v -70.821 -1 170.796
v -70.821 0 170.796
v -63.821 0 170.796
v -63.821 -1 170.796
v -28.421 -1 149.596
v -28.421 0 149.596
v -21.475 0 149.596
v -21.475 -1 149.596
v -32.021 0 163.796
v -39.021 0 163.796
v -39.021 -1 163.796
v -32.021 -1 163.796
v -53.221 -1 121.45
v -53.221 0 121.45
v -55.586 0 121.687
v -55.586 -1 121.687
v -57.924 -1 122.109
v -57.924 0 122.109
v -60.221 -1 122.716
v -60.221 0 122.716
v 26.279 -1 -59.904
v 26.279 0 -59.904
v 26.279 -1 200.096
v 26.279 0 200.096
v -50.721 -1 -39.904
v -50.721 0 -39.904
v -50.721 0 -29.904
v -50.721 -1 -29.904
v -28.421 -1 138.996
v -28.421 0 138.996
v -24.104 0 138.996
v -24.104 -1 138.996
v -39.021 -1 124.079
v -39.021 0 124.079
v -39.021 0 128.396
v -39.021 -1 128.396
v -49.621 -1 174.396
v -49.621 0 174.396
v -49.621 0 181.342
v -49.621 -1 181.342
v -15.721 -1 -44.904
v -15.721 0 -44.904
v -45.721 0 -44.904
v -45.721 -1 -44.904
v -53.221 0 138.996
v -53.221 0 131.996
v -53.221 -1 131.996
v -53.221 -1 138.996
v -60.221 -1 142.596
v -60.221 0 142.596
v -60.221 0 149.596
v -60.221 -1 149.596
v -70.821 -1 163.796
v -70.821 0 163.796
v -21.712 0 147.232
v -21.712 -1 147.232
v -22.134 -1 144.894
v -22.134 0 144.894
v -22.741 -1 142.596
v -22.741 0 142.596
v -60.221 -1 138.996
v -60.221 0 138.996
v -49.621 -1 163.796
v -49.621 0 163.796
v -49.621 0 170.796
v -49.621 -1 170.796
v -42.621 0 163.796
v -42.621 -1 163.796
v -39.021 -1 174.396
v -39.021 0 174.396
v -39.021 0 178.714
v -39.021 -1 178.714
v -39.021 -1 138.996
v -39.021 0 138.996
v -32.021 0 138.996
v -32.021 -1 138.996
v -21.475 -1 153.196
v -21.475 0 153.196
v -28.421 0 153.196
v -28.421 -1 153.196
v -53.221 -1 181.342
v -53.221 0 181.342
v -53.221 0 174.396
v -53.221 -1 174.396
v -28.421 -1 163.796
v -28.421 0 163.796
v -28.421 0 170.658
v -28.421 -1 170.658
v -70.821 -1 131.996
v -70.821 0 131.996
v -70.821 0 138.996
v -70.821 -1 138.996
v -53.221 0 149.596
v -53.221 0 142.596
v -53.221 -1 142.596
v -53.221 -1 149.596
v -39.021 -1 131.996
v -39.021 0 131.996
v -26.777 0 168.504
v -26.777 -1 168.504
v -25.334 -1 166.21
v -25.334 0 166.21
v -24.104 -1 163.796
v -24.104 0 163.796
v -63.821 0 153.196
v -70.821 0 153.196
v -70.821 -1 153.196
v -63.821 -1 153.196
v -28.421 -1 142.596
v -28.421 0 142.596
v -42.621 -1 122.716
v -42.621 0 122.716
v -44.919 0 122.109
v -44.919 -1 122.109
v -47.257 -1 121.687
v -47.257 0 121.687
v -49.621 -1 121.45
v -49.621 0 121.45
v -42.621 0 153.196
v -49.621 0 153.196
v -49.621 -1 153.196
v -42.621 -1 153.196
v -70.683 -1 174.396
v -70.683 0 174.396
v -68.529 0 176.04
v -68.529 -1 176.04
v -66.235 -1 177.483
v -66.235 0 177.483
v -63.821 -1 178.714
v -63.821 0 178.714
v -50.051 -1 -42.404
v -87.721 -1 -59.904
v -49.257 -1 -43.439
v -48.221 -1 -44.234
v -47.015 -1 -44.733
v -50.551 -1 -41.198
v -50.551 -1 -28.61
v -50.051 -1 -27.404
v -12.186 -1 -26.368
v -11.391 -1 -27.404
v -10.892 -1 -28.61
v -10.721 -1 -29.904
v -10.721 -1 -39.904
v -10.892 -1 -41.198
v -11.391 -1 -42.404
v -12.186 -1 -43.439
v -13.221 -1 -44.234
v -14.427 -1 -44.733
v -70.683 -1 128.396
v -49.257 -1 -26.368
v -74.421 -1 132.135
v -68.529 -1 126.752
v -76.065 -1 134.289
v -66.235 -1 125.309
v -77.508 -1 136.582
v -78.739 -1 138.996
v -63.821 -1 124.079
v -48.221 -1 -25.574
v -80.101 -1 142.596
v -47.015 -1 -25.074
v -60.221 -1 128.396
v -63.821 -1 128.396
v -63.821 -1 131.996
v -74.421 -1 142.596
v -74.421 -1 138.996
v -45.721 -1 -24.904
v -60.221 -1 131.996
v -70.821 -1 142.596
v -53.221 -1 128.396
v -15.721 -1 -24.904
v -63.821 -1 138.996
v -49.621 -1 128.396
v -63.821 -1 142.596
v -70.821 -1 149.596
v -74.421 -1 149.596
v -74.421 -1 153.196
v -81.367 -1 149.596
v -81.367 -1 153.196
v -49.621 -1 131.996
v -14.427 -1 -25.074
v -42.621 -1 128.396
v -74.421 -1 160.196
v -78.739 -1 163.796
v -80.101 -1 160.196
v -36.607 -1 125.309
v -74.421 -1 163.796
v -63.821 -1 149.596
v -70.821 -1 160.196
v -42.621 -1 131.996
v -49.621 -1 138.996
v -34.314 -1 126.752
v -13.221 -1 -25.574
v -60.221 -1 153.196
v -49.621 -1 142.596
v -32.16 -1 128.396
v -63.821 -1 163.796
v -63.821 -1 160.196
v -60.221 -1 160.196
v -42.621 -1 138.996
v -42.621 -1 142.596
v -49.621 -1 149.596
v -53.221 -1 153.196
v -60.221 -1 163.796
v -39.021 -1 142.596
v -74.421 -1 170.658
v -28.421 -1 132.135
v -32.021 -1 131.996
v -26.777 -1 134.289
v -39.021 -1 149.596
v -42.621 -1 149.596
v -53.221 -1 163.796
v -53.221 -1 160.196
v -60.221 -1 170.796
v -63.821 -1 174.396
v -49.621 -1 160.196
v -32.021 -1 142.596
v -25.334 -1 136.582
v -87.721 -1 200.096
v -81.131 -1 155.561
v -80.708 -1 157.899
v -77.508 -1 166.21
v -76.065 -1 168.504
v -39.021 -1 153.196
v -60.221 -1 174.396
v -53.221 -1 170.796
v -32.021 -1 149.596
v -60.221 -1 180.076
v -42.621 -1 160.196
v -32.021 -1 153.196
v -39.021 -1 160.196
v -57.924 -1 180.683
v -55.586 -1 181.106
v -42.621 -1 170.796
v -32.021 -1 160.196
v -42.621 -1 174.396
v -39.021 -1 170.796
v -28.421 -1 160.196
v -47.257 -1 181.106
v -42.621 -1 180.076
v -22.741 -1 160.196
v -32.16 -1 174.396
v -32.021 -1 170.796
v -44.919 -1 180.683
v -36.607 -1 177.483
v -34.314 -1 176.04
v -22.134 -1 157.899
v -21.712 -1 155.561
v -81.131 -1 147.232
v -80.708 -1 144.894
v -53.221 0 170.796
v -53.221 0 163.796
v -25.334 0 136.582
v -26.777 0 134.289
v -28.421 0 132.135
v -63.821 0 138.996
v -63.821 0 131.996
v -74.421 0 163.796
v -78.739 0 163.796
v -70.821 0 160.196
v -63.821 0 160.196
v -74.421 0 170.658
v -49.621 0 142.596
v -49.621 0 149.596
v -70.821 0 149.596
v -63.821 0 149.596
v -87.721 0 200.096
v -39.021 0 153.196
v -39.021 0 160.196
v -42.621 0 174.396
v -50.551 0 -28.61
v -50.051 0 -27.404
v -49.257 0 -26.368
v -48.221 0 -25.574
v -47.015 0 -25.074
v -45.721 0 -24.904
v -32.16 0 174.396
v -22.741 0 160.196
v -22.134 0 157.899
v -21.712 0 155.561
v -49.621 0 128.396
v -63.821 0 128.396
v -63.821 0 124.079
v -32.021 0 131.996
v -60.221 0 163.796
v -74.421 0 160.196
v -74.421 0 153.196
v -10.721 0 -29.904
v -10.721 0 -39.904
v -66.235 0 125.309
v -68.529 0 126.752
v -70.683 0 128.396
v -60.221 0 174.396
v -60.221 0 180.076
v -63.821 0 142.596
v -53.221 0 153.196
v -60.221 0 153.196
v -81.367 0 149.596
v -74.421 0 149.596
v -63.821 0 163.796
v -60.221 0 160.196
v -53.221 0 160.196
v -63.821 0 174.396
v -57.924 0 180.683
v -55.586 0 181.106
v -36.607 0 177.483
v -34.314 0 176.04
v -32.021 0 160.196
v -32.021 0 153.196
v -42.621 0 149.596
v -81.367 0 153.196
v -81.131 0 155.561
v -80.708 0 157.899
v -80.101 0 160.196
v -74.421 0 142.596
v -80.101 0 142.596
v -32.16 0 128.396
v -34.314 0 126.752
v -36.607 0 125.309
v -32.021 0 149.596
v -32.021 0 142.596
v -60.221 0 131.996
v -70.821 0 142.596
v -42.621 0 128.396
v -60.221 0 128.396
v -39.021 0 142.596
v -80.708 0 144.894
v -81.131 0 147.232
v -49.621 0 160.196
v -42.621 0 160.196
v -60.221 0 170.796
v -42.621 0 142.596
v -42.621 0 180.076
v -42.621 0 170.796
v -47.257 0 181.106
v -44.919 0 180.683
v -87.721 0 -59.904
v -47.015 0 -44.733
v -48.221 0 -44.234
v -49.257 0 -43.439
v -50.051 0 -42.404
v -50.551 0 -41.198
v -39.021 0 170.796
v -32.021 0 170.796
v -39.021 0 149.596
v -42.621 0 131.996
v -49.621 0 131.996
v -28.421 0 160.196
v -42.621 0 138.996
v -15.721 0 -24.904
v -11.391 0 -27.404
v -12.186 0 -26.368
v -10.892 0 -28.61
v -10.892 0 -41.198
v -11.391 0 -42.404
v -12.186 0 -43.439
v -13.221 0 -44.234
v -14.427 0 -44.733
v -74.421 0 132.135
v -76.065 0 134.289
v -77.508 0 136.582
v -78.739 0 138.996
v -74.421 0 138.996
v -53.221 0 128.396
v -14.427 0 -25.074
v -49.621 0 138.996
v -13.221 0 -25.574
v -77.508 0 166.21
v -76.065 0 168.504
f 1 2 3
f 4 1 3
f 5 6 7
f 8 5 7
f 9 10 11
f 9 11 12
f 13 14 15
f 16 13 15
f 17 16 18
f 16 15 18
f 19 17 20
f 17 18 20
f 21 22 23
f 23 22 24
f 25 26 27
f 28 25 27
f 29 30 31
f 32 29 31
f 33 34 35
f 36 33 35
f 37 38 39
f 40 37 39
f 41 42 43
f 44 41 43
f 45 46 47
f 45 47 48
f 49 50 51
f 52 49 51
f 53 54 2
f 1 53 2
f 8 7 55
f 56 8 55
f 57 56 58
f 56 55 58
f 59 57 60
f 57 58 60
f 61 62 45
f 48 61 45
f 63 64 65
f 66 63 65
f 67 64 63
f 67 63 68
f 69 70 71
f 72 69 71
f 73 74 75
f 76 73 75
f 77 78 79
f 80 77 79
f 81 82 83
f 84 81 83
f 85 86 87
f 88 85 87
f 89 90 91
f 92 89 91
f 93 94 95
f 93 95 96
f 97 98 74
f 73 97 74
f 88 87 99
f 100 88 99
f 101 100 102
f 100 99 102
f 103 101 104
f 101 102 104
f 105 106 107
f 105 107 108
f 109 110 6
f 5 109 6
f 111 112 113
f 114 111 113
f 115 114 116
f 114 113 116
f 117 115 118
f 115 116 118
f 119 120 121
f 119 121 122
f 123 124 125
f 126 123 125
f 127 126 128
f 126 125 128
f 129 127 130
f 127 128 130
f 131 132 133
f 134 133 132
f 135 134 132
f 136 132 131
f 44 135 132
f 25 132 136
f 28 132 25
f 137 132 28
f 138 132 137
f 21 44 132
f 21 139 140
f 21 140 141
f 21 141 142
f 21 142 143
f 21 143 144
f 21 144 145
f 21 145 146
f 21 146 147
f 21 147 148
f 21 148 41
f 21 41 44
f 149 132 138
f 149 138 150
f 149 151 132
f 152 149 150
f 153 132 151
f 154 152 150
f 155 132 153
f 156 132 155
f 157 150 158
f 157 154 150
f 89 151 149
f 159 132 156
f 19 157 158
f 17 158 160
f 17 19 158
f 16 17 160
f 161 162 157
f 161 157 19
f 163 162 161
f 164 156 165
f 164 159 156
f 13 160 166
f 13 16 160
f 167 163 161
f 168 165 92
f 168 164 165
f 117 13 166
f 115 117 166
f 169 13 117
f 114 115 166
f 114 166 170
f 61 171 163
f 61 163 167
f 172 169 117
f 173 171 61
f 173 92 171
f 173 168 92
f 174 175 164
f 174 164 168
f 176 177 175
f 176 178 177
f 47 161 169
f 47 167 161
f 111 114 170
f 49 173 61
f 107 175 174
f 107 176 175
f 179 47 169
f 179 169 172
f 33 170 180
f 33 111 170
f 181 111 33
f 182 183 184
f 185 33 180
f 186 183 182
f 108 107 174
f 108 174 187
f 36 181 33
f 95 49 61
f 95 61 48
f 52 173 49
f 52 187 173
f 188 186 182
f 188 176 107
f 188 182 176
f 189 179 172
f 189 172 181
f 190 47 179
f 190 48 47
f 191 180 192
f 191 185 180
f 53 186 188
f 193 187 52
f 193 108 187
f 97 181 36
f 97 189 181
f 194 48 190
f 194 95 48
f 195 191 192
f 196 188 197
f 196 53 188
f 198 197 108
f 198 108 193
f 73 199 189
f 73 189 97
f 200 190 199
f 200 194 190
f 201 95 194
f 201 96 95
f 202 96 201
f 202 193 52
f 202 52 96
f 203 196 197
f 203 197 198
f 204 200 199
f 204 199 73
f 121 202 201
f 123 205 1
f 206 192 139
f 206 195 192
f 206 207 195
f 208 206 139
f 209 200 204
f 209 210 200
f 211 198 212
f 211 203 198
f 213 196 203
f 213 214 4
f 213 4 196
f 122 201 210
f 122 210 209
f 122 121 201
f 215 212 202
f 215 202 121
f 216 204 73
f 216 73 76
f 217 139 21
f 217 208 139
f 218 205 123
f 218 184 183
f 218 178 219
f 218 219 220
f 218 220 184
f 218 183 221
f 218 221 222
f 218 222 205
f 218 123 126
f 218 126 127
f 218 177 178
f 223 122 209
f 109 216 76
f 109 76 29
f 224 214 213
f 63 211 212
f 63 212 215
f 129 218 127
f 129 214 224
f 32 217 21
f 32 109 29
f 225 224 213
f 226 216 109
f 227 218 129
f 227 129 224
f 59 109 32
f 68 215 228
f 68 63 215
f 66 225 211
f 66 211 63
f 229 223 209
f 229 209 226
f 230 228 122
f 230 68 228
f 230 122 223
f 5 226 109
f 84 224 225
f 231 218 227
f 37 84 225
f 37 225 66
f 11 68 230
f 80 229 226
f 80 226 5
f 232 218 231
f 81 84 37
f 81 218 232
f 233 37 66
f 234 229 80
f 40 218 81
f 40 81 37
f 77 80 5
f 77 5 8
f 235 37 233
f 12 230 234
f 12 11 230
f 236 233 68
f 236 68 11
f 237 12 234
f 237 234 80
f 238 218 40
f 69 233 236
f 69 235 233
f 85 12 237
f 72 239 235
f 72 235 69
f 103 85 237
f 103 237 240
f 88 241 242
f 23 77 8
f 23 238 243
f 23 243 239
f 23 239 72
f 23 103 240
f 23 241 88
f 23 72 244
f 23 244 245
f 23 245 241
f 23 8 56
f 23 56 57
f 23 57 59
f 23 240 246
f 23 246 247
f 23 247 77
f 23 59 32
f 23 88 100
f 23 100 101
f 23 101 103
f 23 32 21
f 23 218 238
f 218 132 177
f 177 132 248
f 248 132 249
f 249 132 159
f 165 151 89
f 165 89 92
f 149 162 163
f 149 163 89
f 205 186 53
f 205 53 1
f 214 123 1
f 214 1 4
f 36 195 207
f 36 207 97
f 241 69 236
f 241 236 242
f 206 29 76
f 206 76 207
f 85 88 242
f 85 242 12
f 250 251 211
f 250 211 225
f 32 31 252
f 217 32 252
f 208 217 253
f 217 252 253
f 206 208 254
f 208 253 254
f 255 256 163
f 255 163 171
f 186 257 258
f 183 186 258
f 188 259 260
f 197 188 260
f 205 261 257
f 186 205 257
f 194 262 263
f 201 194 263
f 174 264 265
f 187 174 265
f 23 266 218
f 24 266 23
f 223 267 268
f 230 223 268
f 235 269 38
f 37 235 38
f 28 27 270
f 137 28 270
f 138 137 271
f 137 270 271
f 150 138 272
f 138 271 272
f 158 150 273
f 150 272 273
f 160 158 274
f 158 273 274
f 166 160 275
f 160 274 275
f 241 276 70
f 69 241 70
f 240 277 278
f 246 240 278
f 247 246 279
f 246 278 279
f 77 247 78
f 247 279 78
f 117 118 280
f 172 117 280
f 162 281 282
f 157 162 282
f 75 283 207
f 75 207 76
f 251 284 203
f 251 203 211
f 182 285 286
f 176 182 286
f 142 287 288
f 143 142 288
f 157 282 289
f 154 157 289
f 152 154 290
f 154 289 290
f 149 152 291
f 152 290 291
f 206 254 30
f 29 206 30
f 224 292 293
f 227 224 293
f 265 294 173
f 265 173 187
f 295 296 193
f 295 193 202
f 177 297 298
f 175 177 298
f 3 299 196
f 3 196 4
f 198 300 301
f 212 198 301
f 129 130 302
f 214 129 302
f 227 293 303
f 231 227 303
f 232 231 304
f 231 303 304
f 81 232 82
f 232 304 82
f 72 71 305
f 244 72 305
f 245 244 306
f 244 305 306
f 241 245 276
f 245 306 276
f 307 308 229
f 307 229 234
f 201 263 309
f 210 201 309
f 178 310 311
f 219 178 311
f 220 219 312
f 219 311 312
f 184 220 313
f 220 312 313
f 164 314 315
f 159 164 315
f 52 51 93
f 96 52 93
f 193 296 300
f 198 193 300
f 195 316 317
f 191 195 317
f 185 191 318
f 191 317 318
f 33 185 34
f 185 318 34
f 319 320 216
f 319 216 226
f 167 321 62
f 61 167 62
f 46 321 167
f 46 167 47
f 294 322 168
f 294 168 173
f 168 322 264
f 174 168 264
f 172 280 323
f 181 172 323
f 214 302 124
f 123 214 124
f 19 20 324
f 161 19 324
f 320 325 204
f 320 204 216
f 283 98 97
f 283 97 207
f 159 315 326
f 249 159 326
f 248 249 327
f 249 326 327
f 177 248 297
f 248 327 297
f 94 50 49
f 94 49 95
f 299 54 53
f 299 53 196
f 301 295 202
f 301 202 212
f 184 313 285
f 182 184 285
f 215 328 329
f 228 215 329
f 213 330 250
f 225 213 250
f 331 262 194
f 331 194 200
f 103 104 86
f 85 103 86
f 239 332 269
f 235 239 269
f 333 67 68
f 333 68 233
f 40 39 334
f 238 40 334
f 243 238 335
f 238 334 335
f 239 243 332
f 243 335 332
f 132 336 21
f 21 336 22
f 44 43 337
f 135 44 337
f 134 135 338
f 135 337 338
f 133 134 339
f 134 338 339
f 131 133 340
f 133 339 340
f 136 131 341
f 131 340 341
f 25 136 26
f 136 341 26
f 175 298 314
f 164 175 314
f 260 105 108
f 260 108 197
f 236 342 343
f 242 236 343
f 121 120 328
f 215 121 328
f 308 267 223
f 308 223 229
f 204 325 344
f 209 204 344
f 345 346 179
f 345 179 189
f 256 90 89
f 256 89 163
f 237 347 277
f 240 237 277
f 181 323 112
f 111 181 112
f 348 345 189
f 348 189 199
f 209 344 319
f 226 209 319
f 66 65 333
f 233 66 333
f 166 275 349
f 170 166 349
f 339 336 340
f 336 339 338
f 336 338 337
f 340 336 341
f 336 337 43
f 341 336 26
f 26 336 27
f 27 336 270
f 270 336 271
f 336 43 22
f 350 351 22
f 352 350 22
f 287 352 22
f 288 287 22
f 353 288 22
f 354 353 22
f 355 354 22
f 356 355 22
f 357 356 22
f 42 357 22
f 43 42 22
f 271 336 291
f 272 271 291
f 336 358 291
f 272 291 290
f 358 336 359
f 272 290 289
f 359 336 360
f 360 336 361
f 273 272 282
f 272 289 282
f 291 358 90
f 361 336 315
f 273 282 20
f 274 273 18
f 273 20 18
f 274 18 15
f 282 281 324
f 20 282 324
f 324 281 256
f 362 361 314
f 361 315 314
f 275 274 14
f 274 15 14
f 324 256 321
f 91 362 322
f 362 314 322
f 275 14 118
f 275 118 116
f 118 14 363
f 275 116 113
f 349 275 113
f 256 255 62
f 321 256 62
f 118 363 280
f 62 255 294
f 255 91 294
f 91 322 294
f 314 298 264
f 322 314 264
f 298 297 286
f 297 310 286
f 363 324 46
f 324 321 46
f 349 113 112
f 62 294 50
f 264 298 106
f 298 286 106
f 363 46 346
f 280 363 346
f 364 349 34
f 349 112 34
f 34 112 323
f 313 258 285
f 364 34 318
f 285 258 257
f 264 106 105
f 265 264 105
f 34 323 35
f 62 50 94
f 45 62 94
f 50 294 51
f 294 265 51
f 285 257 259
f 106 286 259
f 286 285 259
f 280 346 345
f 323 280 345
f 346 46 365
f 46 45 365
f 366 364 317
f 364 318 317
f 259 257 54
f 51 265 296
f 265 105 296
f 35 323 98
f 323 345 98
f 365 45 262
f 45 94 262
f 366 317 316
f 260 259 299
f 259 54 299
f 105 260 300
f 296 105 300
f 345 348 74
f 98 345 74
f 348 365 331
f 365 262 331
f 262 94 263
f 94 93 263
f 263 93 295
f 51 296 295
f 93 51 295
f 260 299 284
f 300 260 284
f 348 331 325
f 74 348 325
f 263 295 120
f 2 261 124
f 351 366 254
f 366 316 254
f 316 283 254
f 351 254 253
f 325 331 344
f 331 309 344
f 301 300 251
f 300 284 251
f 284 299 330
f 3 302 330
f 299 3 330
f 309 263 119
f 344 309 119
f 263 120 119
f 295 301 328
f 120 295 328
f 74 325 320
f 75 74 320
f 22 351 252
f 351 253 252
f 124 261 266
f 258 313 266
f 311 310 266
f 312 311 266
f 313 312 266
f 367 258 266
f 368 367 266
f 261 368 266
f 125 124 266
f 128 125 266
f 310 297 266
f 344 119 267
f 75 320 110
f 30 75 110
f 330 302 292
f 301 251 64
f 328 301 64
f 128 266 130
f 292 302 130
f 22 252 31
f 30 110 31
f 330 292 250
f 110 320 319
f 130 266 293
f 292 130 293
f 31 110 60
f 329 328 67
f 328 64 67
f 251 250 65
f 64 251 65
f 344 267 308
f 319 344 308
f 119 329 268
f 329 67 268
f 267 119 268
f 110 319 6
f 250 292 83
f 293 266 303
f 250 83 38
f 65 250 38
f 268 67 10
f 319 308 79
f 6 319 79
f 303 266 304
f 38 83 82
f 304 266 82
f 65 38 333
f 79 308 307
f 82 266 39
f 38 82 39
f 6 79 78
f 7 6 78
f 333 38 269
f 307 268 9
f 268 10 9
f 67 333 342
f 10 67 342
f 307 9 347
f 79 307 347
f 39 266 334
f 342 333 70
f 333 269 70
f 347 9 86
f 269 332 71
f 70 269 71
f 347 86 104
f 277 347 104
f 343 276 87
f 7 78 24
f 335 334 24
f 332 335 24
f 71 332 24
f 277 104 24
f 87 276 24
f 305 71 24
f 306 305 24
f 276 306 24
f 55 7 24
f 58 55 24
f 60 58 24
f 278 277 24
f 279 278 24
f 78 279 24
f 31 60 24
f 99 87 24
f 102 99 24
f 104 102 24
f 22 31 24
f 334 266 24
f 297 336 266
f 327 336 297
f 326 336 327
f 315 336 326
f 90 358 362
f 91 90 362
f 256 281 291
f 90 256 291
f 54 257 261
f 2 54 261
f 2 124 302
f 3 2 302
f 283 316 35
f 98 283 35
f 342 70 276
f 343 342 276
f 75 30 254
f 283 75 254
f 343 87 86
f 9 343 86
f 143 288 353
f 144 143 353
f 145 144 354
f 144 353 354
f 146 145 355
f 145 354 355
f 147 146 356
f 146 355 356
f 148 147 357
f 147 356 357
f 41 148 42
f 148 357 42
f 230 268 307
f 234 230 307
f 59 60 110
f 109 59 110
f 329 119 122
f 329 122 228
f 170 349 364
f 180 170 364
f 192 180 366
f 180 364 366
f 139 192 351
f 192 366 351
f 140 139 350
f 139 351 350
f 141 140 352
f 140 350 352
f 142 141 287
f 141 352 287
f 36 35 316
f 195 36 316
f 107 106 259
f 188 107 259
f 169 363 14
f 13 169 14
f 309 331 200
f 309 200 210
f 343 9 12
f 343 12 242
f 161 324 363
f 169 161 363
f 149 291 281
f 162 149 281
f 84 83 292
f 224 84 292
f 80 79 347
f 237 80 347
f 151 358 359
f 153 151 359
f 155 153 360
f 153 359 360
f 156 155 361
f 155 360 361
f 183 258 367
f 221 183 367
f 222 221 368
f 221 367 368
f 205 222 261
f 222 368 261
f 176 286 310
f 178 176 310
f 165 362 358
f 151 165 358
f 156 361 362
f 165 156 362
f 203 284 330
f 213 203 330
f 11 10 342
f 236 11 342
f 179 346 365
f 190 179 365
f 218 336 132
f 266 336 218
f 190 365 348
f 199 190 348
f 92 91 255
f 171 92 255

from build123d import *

# Parameters (mm, degrees)
F0_W     = 114
F0_H     = 260
F0_W_2   = 7
F0_H_2   = 7
F1_DEPTH = 1


with BuildPart() as f1:
    # F0 (on Front) → F1 (new body)
    with BuildSketch(Plane.XZ):
        with Locations((-30.721168, 70.096179)):
            Rectangle(F0_W, F0_H)
        with BuildLine():
            ThreePointArc((-50.721168, -29.903821), (-49.256702, -26.368287), (-45.721168, -24.903821))
            Line((-45.721168, -24.903821), (-15.721168, -24.903821))
            ThreePointArc((-15.721168, -24.903821), (-12.185634, -26.368287), (-10.721168, -29.903821))
            Line((-10.721168, -29.903821), (-10.721168, -39.903821))
            ThreePointArc((-10.721168, -39.903821), (-12.185634, -43.439354), (-15.721168, -44.903821))
            Line((-15.721168, -44.903821), (-45.721168, -44.903821))
            ThreePointArc((-45.721168, -44.903821), (-49.256702, -43.439354), (-50.721168, -39.903821))
            Line((-50.721168, -39.903821), (-50.721168, -29.903821))
        make_face(mode=Mode.SUBTRACT)
        with Locations((-77.921168, 114.296179)):
            Rectangle(F0_W_2, F0_H_2, mode=Mode.SUBTRACT)
        with Locations((-77.921168, 124.896179)):
            Rectangle(F0_W_2, F0_H_2, mode=Mode.SUBTRACT)
        with Locations((-67.321168, 114.296179)):
            Rectangle(F0_W_2, F0_H_2, mode=Mode.SUBTRACT)
        with Locations((-56.721168, 114.296179)):
            Rectangle(F0_W_2, F0_H_2, mode=Mode.SUBTRACT)
        with Locations((-46.121168, 114.296179)):
            Rectangle(F0_W_2, F0_H_2, mode=Mode.SUBTRACT)
        with Locations((-35.521168, 114.296179)):
            Rectangle(F0_W_2, F0_H_2, mode=Mode.SUBTRACT)
        with Locations((-77.921168, 177.896179)):
            Rectangle(F0_W_2, F0_H_2, mode=Mode.SUBTRACT)
        with BuildLine():
            ThreePointArc((-21.475216, 153.196179), (-21.434683, 152.296585), (-21.421168, 151.396179))
            ThreePointArc((-21.421168, 151.396179), (-21.434683, 150.495774), (-21.475216, 149.596179))
            Line((-21.475216, 149.596179), (-21.421168, 149.596179))
            Line((-21.421168, 149.596179), (-21.421168, 142.596179))
            Line((-21.421168, 142.596179), (-22.740861, 142.596179))
            ThreePointArc((-22.740861, 142.596179), (-23.364518, 140.774297), (-24.103774, 138.996179))
            Line((-24.103774, 138.996179), (-21.421168, 138.996179))
            Line((-21.421168, 138.996179), (-21.421168, 131.996179))
            Line((-21.421168, 131.996179), (-28.421168, 131.996179))
            Line((-28.421168, 131.996179), (-28.421168, 132.134819))
            ThreePointArc((-28.421168, 132.134819), (-30.207964, 130.182976), (-32.159807, 128.396179))
            Line((-32.159807, 128.396179), (-32.021168, 128.396179))
            Line((-32.021168, 128.396179), (-32.021168, 121.396179))
            Line((-32.021168, 121.396179), (-39.021168, 121.396179))
            Line((-39.021168, 121.396179), (-39.021168, 124.078786))
            ThreePointArc((-39.021168, 124.078786), (-40.799286, 123.339529), (-42.621168, 122.715873))
            Line((-42.621168, 122.715873), (-42.621168, 121.396179))
            Line((-42.621168, 121.396179), (-49.621168, 121.396179))
            Line((-49.621168, 121.396179), (-49.621168, 121.450228))
            ThreePointArc((-49.621168, 121.450228), (-51.421168, 121.396179), (-53.221168, 121.450228))
            Line((-53.221168, 121.450228), (-53.221168, 121.396179))
            Line((-53.221168, 121.396179), (-60.221168, 121.396179))
            Line((-60.221168, 121.396179), (-60.221168, 122.715873))
            ThreePointArc((-60.221168, 122.715873), (-62.04305, 123.339529), (-63.821168, 124.078786))
            Line((-63.821168, 124.078786), (-63.821168, 121.396179))
            Line((-63.821168, 121.396179), (-70.821168, 121.396179))
            Line((-70.821168, 121.396179), (-70.821168, 128.396179))
            Line((-70.821168, 128.396179), (-70.682528, 128.396179))
            ThreePointArc((-70.682528, 128.396179), (-72.634371, 130.182976), (-74.421168, 132.134819))
            Line((-74.421168, 132.134819), (-74.421168, 131.996179))
            Line((-74.421168, 131.996179), (-81.421168, 131.996179))
            Line((-81.421168, 131.996179), (-81.421168, 138.996179))
            Line((-81.421168, 138.996179), (-78.738562, 138.996179))
            ThreePointArc((-78.738562, 138.996179), (-79.477818, 140.774297), (-80.101475, 142.596179))
            Line((-80.101475, 142.596179), (-81.421168, 142.596179))
            Line((-81.421168, 142.596179), (-81.421168, 149.596179))
            Line((-81.421168, 149.596179), (-81.367119, 149.596179))
            ThreePointArc((-81.367119, 149.596179), (-81.421168, 151.396179), (-81.367119, 153.196179))
            Line((-81.367119, 153.196179), (-81.421168, 153.196179))
            Line((-81.421168, 153.196179), (-81.421168, 160.196179))
            Line((-81.421168, 160.196179), (-80.101475, 160.196179))
            ThreePointArc((-80.101475, 160.196179), (-79.477818, 162.018062), (-78.738562, 163.796179))
            Line((-78.738562, 163.796179), (-81.421168, 163.796179))
            Line((-81.421168, 163.796179), (-81.421168, 170.796179))
            Line((-81.421168, 170.796179), (-74.421168, 170.796179))
            Line((-74.421168, 170.796179), (-74.421168, 170.65754))
            ThreePointArc((-74.421168, 170.65754), (-72.634371, 172.609383), (-70.682528, 174.396179))
            Line((-70.682528, 174.396179), (-70.821168, 174.396179))
            Line((-70.821168, 174.396179), (-70.821168, 181.396179))
            Line((-70.821168, 181.396179), (-63.821168, 181.396179))
            Line((-63.821168, 181.396179), (-63.821168, 178.713573))
            ThreePointArc((-63.821168, 178.713573), (-62.04305, 179.45283), (-60.221168, 180.076486))
            Line((-60.221168, 180.076486), (-60.221168, 181.396179))
            Line((-60.221168, 181.396179), (-53.221168, 181.396179))
            Line((-53.221168, 181.396179), (-53.221168, 181.342131))
            ThreePointArc((-53.221168, 181.342131), (-51.421168, 181.396179), (-49.621168, 181.342131))
            Line((-49.621168, 181.342131), (-49.621168, 181.396179))
            Line((-49.621168, 181.396179), (-42.621168, 181.396179))
            Line((-42.621168, 181.396179), (-42.621168, 180.076486))
            ThreePointArc((-42.621168, 180.076486), (-40.799286, 179.45283), (-39.021168, 178.713573))
            Line((-39.021168, 178.713573), (-39.021168, 181.396179))
            Line((-39.021168, 181.396179), (-32.021168, 181.396179))
            Line((-32.021168, 181.396179), (-32.021168, 174.396179))
            Line((-32.021168, 174.396179), (-32.159807, 174.396179))
            ThreePointArc((-32.159807, 174.396179), (-30.207964, 172.609383), (-28.421168, 170.65754))
            Line((-28.421168, 170.65754), (-28.421168, 170.796179))
            Line((-28.421168, 170.796179), (-21.421168, 170.796179))
            Line((-21.421168, 170.796179), (-21.421168, 163.796179))
            Line((-21.421168, 163.796179), (-24.103774, 163.796179))
            ThreePointArc((-24.103774, 163.796179), (-23.364518, 162.018062), (-22.740861, 160.196179))
            Line((-22.740861, 160.196179), (-21.421168, 160.196179))
            Line((-21.421168, 160.196179), (-21.421168, 153.196179))
            Line((-21.421168, 153.196179), (-21.475216, 153.196179))
        make_face(mode=Mode.SUBTRACT)
        with Locations((-24.921168, 114.296179)):
            Rectangle(F0_W_2, F0_H_2, mode=Mode.SUBTRACT)
        with Locations((-24.921168, 124.896179)):
            Rectangle(F0_W_2, F0_H_2, mode=Mode.SUBTRACT)
        with Locations((-14.321168, 114.296179)):
            Rectangle(F0_W_2, F0_H_2, mode=Mode.SUBTRACT)
        with Locations((-14.321168, 124.896179)):
            Rectangle(F0_W_2, F0_H_2, mode=Mode.SUBTRACT)
        with Locations((-14.321168, 135.496179)):
            Rectangle(F0_W_2, F0_H_2, mode=Mode.SUBTRACT)
        with Locations((-14.321168, 146.096179)):
            Rectangle(F0_W_2, F0_H_2, mode=Mode.SUBTRACT)
        with Locations((-14.321168, 156.696179)):
            Rectangle(F0_W_2, F0_H_2, mode=Mode.SUBTRACT)
        with Locations((-14.321168, 167.296179)):
            Rectangle(F0_W_2, F0_H_2, mode=Mode.SUBTRACT)
        with Locations((-24.921168, 177.896179)):
            Rectangle(F0_W_2, F0_H_2, mode=Mode.SUBTRACT)
        with Locations((-14.321168, 177.896179)):
            Rectangle(F0_W_2, F0_H_2, mode=Mode.SUBTRACT)
        with BuildLine():
            ThreePointArc((-21.475216, 149.596179), (-21.434683, 150.495774), (-21.421168, 151.396179))
            ThreePointArc((-21.421168, 151.396179), (-21.434683, 152.296585), (-21.475216, 153.196179))
            Line((-21.475216, 153.196179), (-28.421168, 153.196179))
            Line((-28.421168, 153.196179), (-28.421168, 160.196179))
            Line((-28.421168, 160.196179), (-22.740861, 160.196179))
            ThreePointArc((-22.740861, 160.196179), (-23.364518, 162.018062), (-24.103774, 163.796179))
            Line((-24.103774, 163.796179), (-28.421168, 163.796179))
            Line((-28.421168, 163.796179), (-28.421168, 170.65754))
            ThreePointArc((-28.421168, 170.65754), (-30.207964, 172.609383), (-32.159807, 174.396179))
            Line((-32.159807, 174.396179), (-39.021168, 174.396179))
            Line((-39.021168, 174.396179), (-39.021168, 178.713573))
            ThreePointArc((-39.021168, 178.713573), (-40.799286, 179.45283), (-42.621168, 180.076486))
            Line((-42.621168, 180.076486), (-42.621168, 174.396179))
            Line((-42.621168, 174.396179), (-49.621168, 174.396179))
            Line((-49.621168, 174.396179), (-49.621168, 181.342131))
            ThreePointArc((-49.621168, 181.342131), (-51.421168, 181.396179), (-53.221168, 181.342131))
            Line((-53.221168, 181.342131), (-53.221168, 174.396179))
            Line((-53.221168, 174.396179), (-60.221168, 174.396179))
            Line((-60.221168, 174.396179), (-60.221168, 180.076486))
            ThreePointArc((-60.221168, 180.076486), (-62.04305, 179.45283), (-63.821168, 178.713573))
            Line((-63.821168, 178.713573), (-63.821168, 174.396179))
            Line((-63.821168, 174.396179), (-70.682528, 174.396179))
            ThreePointArc((-70.682528, 174.396179), (-72.634371, 172.609383), (-74.421168, 170.65754))
            Line((-74.421168, 170.65754), (-74.421168, 163.796179))
            Line((-74.421168, 163.796179), (-78.738562, 163.796179))
            ThreePointArc((-78.738562, 163.796179), (-79.477818, 162.018062), (-80.101475, 160.196179))
            Line((-80.101475, 160.196179), (-74.421168, 160.196179))
            Line((-74.421168, 160.196179), (-74.421168, 153.196179))
            Line((-74.421168, 153.196179), (-81.367119, 153.196179))
            ThreePointArc((-81.367119, 153.196179), (-81.421168, 151.396179), (-81.367119, 149.596179))
            Line((-81.367119, 149.596179), (-74.421168, 149.596179))
            Line((-74.421168, 149.596179), (-74.421168, 142.596179))
            Line((-74.421168, 142.596179), (-80.101475, 142.596179))
            ThreePointArc((-80.101475, 142.596179), (-79.477818, 140.774297), (-78.738562, 138.996179))
            Line((-78.738562, 138.996179), (-74.421168, 138.996179))
            Line((-74.421168, 138.996179), (-74.421168, 132.134819))
            ThreePointArc((-74.421168, 132.134819), (-72.634371, 130.182976), (-70.682528, 128.396179))
            Line((-70.682528, 128.396179), (-63.821168, 128.396179))
            Line((-63.821168, 128.396179), (-63.821168, 124.078786))
            ThreePointArc((-63.821168, 124.078786), (-62.04305, 123.339529), (-60.221168, 122.715873))
            Line((-60.221168, 122.715873), (-60.221168, 128.396179))
            Line((-60.221168, 128.396179), (-53.221168, 128.396179))
            Line((-53.221168, 128.396179), (-53.221168, 121.450228))
            ThreePointArc((-53.221168, 121.450228), (-51.421168, 121.396179), (-49.621168, 121.450228))
            Line((-49.621168, 121.450228), (-49.621168, 128.396179))
            Line((-49.621168, 128.396179), (-42.621168, 128.396179))
            Line((-42.621168, 128.396179), (-42.621168, 122.715873))
            ThreePointArc((-42.621168, 122.715873), (-40.799286, 123.339529), (-39.021168, 124.078786))
            Line((-39.021168, 124.078786), (-39.021168, 128.396179))
            Line((-39.021168, 128.396179), (-32.159807, 128.396179))
            ThreePointArc((-32.159807, 128.396179), (-30.207964, 130.182976), (-28.421168, 132.134819))
            Line((-28.421168, 132.134819), (-28.421168, 138.996179))
            Line((-28.421168, 138.996179), (-24.103774, 138.996179))
            ThreePointArc((-24.103774, 138.996179), (-23.364518, 140.774297), (-22.740861, 142.596179))
            Line((-22.740861, 142.596179), (-28.421168, 142.596179))
            Line((-28.421168, 142.596179), (-28.421168, 149.596179))
            Line((-28.421168, 149.596179), (-21.475216, 149.596179))
        make_face()
        with Locations((-67.321168, 135.496179)):
            Rectangle(F0_W_2, F0_H_2, mode=Mode.SUBTRACT)
        with Locations((-67.321168, 146.096179)):
            Rectangle(F0_W_2, F0_H_2, mode=Mode.SUBTRACT)
        with Locations((-67.321168, 156.696179)):
            Rectangle(F0_W_2, F0_H_2, mode=Mode.SUBTRACT)
        with Locations((-67.321168, 167.296179)):
            Rectangle(F0_W_2, F0_H_2, mode=Mode.SUBTRACT)
        with Locations((-56.721168, 135.496179)):
            Rectangle(F0_W_2, F0_H_2, mode=Mode.SUBTRACT)
        with Locations((-56.721168, 146.096179)):
            Rectangle(F0_W_2, F0_H_2, mode=Mode.SUBTRACT)
        with Locations((-46.121168, 135.496179)):
            Rectangle(F0_W_2, F0_H_2, mode=Mode.SUBTRACT)
        with Locations((-46.121168, 146.096179)):
            Rectangle(F0_W_2, F0_H_2, mode=Mode.SUBTRACT)
        with Locations((-56.721168, 156.696179)):
            Rectangle(F0_W_2, F0_H_2, mode=Mode.SUBTRACT)
        with Locations((-56.721168, 167.296179)):
            Rectangle(F0_W_2, F0_H_2, mode=Mode.SUBTRACT)
        with Locations((-46.121168, 156.696179)):
            Rectangle(F0_W_2, F0_H_2, mode=Mode.SUBTRACT)
        with Locations((-46.121168, 167.296179)):
            Rectangle(F0_W_2, F0_H_2, mode=Mode.SUBTRACT)
        with Locations((-35.521168, 135.496179)):
            Rectangle(F0_W_2, F0_H_2, mode=Mode.SUBTRACT)
        with Locations((-35.521168, 146.096179)):
            Rectangle(F0_W_2, F0_H_2, mode=Mode.SUBTRACT)
        with Locations((-35.521168, 156.696179)):
            Rectangle(F0_W_2, F0_H_2, mode=Mode.SUBTRACT)
        with Locations((-35.521168, 167.296179)):
            Rectangle(F0_W_2, F0_H_2, mode=Mode.SUBTRACT)
        with Locations((-77.921168, 177.896179)):
            Rectangle(F0_W_2, F0_H_2)
        with BuildLine():
            ThreePointArc((-70.682528, 174.396179), (-67.398352, 176.787706), (-63.821168, 178.713573))
            Line((-63.821168, 178.713573), (-63.821168, 181.396179))
            Line((-63.821168, 181.396179), (-70.821168, 181.396179))
            Line((-70.821168, 181.396179), (-70.821168, 174.396179))
            Line((-70.821168, 174.396179), (-70.682528, 174.396179))
        make_face()
        with BuildLine():
            ThreePointArc((-78.738562, 163.796179), (-76.812694, 167.373363), (-74.421168, 170.65754))
            Line((-74.421168, 170.65754), (-74.421168, 170.796179))
            Line((-74.421168, 170.796179), (-81.421168, 170.796179))
            Line((-81.421168, 170.796179), (-81.421168, 163.796179))
            Line((-81.421168, 163.796179), (-78.738562, 163.796179))
        make_face()
        with BuildLine():
            Line((-74.421168, 131.996179), (-74.421168, 132.134819))
            ThreePointArc((-74.421168, 132.134819), (-76.812694, 135.418996), (-78.738562, 138.996179))
            Line((-78.738562, 138.996179), (-81.421168, 138.996179))
            Line((-81.421168, 138.996179), (-81.421168, 131.996179))
            Line((-81.421168, 131.996179), (-74.421168, 131.996179))
        make_face()
        with Locations((-77.921168, 124.896179)):
            Rectangle(F0_W_2, F0_H_2)
        with Locations((-77.921168, 114.296179)):
            Rectangle(F0_W_2, F0_H_2)
        with BuildLine():
            Line((-63.821168, 121.396179), (-63.821168, 124.078786))
            ThreePointArc((-63.821168, 124.078786), (-67.398352, 126.004653), (-70.682528, 128.396179))
            Line((-70.682528, 128.396179), (-70.821168, 128.396179))
            Line((-70.821168, 128.396179), (-70.821168, 121.396179))
            Line((-70.821168, 121.396179), (-63.821168, 121.396179))
        make_face()
        with Locations((-67.321168, 114.296179)):
            Rectangle(F0_W_2, F0_H_2)
        with Locations((-56.721168, 114.296179)):
            Rectangle(F0_W_2, F0_H_2)
        with Locations((-46.121168, 114.296179)):
            Rectangle(F0_W_2, F0_H_2)
        with Locations((-35.521168, 114.296179)):
            Rectangle(F0_W_2, F0_H_2)
        with BuildLine():
            Line((-32.021168, 128.396179), (-32.159807, 128.396179))
            ThreePointArc((-32.159807, 128.396179), (-35.443984, 126.004653), (-39.021168, 124.078786))
            Line((-39.021168, 124.078786), (-39.021168, 121.396179))
            Line((-39.021168, 121.396179), (-32.021168, 121.396179))
            Line((-32.021168, 121.396179), (-32.021168, 128.396179))
        make_face()
        with Locations((-24.921168, 124.896179)):
            Rectangle(F0_W_2, F0_H_2)
        with Locations((-24.921168, 114.296179)):
            Rectangle(F0_W_2, F0_H_2)
        with Locations((-14.321168, 114.296179)):
            Rectangle(F0_W_2, F0_H_2)
        with Locations((-14.321168, 124.896179)):
            Rectangle(F0_W_2, F0_H_2)
        with Locations((-14.321168, 135.496179)):
            Rectangle(F0_W_2, F0_H_2)
        with BuildLine():
            Line((-21.421168, 138.996179), (-24.103774, 138.996179))
            ThreePointArc((-24.103774, 138.996179), (-26.029642, 135.418996), (-28.421168, 132.134819))
            Line((-28.421168, 132.134819), (-28.421168, 131.996179))
            Line((-28.421168, 131.996179), (-21.421168, 131.996179))
            Line((-21.421168, 131.996179), (-21.421168, 138.996179))
        make_face()
        with Locations((-14.321168, 146.096179)):
            Rectangle(F0_W_2, F0_H_2)
        with Locations((-14.321168, 156.696179)):
            Rectangle(F0_W_2, F0_H_2)
        with Locations((-14.321168, 167.296179)):
            Rectangle(F0_W_2, F0_H_2)
        with BuildLine():
            ThreePointArc((-28.421168, 170.65754), (-26.029642, 167.373363), (-24.103774, 163.796179))
            Line((-24.103774, 163.796179), (-21.421168, 163.796179))
            Line((-21.421168, 163.796179), (-21.421168, 170.796179))
            Line((-21.421168, 170.796179), (-28.421168, 170.796179))
            Line((-28.421168, 170.796179), (-28.421168, 170.65754))
        make_face()
        with Locations((-14.321168, 177.896179)):
            Rectangle(F0_W_2, F0_H_2)
        with Locations((-24.921168, 177.896179)):
            Rectangle(F0_W_2, F0_H_2)
        with BuildLine():
            ThreePointArc((-39.021168, 178.713573), (-35.443984, 176.787706), (-32.159807, 174.396179))
            Line((-32.159807, 174.396179), (-32.021168, 174.396179))
            Line((-32.021168, 174.396179), (-32.021168, 181.396179))
            Line((-32.021168, 181.396179), (-39.021168, 181.396179))
            Line((-39.021168, 181.396179), (-39.021168, 178.713573))
        make_face()
        with BuildLine():
            ThreePointArc((-60.221168, 180.076486), (-56.758814, 180.91752), (-53.221168, 181.342131))
            Line((-53.221168, 181.342131), (-53.221168, 181.396179))
            Line((-53.221168, 181.396179), (-60.221168, 181.396179))
            Line((-60.221168, 181.396179), (-60.221168, 180.076486))
        make_face()
        with BuildLine():
            ThreePointArc((-49.621168, 181.342131), (-46.083522, 180.91752), (-42.621168, 180.076486))
            Line((-42.621168, 180.076486), (-42.621168, 181.396179))
            Line((-42.621168, 181.396179), (-49.621168, 181.396179))
            Line((-49.621168, 181.396179), (-49.621168, 181.342131))
        make_face()
        with BuildLine():
            ThreePointArc((-22.740861, 160.196179), (-21.899827, 156.733825), (-21.475216, 153.196179))
            Line((-21.475216, 153.196179), (-21.421168, 153.196179))
            Line((-21.421168, 153.196179), (-21.421168, 160.196179))
            Line((-21.421168, 160.196179), (-22.740861, 160.196179))
        make_face()
        with BuildLine():
            Line((-21.421168, 149.596179), (-21.475216, 149.596179))
            ThreePointArc((-21.475216, 149.596179), (-21.899827, 146.058534), (-22.740861, 142.596179))
            Line((-22.740861, 142.596179), (-21.421168, 142.596179))
            Line((-21.421168, 142.596179), (-21.421168, 149.596179))
        make_face()
        with BuildLine():
            ThreePointArc((-81.367119, 153.196179), (-80.942508, 156.733825), (-80.101475, 160.196179))
            Line((-80.101475, 160.196179), (-81.421168, 160.196179))
            Line((-81.421168, 160.196179), (-81.421168, 153.196179))
            Line((-81.421168, 153.196179), (-81.367119, 153.196179))
        make_face()
        with BuildLine():
            Line((-81.421168, 142.596179), (-80.101475, 142.596179))
            ThreePointArc((-80.101475, 142.596179), (-80.942508, 146.058534), (-81.367119, 149.596179))
            Line((-81.367119, 149.596179), (-81.421168, 149.596179))
            Line((-81.421168, 149.596179), (-81.421168, 142.596179))
        make_face()
        with BuildLine():
            Line((-53.221168, 121.396179), (-53.221168, 121.450228))
            ThreePointArc((-53.221168, 121.450228), (-56.758814, 121.874839), (-60.221168, 122.715873))
            Line((-60.221168, 122.715873), (-60.221168, 121.396179))
            Line((-60.221168, 121.396179), (-53.221168, 121.396179))
        make_face()
        with BuildLine():
            Line((-42.621168, 121.396179), (-42.621168, 122.715873))
            ThreePointArc((-42.621168, 122.715873), (-46.083522, 121.874839), (-49.621168, 121.450228))
            Line((-49.621168, 121.450228), (-49.621168, 121.396179))
            Line((-49.621168, 121.396179), (-42.621168, 121.396179))
        make_face()
    extrude(amount=F1_DEPTH)


solid = f1.part
